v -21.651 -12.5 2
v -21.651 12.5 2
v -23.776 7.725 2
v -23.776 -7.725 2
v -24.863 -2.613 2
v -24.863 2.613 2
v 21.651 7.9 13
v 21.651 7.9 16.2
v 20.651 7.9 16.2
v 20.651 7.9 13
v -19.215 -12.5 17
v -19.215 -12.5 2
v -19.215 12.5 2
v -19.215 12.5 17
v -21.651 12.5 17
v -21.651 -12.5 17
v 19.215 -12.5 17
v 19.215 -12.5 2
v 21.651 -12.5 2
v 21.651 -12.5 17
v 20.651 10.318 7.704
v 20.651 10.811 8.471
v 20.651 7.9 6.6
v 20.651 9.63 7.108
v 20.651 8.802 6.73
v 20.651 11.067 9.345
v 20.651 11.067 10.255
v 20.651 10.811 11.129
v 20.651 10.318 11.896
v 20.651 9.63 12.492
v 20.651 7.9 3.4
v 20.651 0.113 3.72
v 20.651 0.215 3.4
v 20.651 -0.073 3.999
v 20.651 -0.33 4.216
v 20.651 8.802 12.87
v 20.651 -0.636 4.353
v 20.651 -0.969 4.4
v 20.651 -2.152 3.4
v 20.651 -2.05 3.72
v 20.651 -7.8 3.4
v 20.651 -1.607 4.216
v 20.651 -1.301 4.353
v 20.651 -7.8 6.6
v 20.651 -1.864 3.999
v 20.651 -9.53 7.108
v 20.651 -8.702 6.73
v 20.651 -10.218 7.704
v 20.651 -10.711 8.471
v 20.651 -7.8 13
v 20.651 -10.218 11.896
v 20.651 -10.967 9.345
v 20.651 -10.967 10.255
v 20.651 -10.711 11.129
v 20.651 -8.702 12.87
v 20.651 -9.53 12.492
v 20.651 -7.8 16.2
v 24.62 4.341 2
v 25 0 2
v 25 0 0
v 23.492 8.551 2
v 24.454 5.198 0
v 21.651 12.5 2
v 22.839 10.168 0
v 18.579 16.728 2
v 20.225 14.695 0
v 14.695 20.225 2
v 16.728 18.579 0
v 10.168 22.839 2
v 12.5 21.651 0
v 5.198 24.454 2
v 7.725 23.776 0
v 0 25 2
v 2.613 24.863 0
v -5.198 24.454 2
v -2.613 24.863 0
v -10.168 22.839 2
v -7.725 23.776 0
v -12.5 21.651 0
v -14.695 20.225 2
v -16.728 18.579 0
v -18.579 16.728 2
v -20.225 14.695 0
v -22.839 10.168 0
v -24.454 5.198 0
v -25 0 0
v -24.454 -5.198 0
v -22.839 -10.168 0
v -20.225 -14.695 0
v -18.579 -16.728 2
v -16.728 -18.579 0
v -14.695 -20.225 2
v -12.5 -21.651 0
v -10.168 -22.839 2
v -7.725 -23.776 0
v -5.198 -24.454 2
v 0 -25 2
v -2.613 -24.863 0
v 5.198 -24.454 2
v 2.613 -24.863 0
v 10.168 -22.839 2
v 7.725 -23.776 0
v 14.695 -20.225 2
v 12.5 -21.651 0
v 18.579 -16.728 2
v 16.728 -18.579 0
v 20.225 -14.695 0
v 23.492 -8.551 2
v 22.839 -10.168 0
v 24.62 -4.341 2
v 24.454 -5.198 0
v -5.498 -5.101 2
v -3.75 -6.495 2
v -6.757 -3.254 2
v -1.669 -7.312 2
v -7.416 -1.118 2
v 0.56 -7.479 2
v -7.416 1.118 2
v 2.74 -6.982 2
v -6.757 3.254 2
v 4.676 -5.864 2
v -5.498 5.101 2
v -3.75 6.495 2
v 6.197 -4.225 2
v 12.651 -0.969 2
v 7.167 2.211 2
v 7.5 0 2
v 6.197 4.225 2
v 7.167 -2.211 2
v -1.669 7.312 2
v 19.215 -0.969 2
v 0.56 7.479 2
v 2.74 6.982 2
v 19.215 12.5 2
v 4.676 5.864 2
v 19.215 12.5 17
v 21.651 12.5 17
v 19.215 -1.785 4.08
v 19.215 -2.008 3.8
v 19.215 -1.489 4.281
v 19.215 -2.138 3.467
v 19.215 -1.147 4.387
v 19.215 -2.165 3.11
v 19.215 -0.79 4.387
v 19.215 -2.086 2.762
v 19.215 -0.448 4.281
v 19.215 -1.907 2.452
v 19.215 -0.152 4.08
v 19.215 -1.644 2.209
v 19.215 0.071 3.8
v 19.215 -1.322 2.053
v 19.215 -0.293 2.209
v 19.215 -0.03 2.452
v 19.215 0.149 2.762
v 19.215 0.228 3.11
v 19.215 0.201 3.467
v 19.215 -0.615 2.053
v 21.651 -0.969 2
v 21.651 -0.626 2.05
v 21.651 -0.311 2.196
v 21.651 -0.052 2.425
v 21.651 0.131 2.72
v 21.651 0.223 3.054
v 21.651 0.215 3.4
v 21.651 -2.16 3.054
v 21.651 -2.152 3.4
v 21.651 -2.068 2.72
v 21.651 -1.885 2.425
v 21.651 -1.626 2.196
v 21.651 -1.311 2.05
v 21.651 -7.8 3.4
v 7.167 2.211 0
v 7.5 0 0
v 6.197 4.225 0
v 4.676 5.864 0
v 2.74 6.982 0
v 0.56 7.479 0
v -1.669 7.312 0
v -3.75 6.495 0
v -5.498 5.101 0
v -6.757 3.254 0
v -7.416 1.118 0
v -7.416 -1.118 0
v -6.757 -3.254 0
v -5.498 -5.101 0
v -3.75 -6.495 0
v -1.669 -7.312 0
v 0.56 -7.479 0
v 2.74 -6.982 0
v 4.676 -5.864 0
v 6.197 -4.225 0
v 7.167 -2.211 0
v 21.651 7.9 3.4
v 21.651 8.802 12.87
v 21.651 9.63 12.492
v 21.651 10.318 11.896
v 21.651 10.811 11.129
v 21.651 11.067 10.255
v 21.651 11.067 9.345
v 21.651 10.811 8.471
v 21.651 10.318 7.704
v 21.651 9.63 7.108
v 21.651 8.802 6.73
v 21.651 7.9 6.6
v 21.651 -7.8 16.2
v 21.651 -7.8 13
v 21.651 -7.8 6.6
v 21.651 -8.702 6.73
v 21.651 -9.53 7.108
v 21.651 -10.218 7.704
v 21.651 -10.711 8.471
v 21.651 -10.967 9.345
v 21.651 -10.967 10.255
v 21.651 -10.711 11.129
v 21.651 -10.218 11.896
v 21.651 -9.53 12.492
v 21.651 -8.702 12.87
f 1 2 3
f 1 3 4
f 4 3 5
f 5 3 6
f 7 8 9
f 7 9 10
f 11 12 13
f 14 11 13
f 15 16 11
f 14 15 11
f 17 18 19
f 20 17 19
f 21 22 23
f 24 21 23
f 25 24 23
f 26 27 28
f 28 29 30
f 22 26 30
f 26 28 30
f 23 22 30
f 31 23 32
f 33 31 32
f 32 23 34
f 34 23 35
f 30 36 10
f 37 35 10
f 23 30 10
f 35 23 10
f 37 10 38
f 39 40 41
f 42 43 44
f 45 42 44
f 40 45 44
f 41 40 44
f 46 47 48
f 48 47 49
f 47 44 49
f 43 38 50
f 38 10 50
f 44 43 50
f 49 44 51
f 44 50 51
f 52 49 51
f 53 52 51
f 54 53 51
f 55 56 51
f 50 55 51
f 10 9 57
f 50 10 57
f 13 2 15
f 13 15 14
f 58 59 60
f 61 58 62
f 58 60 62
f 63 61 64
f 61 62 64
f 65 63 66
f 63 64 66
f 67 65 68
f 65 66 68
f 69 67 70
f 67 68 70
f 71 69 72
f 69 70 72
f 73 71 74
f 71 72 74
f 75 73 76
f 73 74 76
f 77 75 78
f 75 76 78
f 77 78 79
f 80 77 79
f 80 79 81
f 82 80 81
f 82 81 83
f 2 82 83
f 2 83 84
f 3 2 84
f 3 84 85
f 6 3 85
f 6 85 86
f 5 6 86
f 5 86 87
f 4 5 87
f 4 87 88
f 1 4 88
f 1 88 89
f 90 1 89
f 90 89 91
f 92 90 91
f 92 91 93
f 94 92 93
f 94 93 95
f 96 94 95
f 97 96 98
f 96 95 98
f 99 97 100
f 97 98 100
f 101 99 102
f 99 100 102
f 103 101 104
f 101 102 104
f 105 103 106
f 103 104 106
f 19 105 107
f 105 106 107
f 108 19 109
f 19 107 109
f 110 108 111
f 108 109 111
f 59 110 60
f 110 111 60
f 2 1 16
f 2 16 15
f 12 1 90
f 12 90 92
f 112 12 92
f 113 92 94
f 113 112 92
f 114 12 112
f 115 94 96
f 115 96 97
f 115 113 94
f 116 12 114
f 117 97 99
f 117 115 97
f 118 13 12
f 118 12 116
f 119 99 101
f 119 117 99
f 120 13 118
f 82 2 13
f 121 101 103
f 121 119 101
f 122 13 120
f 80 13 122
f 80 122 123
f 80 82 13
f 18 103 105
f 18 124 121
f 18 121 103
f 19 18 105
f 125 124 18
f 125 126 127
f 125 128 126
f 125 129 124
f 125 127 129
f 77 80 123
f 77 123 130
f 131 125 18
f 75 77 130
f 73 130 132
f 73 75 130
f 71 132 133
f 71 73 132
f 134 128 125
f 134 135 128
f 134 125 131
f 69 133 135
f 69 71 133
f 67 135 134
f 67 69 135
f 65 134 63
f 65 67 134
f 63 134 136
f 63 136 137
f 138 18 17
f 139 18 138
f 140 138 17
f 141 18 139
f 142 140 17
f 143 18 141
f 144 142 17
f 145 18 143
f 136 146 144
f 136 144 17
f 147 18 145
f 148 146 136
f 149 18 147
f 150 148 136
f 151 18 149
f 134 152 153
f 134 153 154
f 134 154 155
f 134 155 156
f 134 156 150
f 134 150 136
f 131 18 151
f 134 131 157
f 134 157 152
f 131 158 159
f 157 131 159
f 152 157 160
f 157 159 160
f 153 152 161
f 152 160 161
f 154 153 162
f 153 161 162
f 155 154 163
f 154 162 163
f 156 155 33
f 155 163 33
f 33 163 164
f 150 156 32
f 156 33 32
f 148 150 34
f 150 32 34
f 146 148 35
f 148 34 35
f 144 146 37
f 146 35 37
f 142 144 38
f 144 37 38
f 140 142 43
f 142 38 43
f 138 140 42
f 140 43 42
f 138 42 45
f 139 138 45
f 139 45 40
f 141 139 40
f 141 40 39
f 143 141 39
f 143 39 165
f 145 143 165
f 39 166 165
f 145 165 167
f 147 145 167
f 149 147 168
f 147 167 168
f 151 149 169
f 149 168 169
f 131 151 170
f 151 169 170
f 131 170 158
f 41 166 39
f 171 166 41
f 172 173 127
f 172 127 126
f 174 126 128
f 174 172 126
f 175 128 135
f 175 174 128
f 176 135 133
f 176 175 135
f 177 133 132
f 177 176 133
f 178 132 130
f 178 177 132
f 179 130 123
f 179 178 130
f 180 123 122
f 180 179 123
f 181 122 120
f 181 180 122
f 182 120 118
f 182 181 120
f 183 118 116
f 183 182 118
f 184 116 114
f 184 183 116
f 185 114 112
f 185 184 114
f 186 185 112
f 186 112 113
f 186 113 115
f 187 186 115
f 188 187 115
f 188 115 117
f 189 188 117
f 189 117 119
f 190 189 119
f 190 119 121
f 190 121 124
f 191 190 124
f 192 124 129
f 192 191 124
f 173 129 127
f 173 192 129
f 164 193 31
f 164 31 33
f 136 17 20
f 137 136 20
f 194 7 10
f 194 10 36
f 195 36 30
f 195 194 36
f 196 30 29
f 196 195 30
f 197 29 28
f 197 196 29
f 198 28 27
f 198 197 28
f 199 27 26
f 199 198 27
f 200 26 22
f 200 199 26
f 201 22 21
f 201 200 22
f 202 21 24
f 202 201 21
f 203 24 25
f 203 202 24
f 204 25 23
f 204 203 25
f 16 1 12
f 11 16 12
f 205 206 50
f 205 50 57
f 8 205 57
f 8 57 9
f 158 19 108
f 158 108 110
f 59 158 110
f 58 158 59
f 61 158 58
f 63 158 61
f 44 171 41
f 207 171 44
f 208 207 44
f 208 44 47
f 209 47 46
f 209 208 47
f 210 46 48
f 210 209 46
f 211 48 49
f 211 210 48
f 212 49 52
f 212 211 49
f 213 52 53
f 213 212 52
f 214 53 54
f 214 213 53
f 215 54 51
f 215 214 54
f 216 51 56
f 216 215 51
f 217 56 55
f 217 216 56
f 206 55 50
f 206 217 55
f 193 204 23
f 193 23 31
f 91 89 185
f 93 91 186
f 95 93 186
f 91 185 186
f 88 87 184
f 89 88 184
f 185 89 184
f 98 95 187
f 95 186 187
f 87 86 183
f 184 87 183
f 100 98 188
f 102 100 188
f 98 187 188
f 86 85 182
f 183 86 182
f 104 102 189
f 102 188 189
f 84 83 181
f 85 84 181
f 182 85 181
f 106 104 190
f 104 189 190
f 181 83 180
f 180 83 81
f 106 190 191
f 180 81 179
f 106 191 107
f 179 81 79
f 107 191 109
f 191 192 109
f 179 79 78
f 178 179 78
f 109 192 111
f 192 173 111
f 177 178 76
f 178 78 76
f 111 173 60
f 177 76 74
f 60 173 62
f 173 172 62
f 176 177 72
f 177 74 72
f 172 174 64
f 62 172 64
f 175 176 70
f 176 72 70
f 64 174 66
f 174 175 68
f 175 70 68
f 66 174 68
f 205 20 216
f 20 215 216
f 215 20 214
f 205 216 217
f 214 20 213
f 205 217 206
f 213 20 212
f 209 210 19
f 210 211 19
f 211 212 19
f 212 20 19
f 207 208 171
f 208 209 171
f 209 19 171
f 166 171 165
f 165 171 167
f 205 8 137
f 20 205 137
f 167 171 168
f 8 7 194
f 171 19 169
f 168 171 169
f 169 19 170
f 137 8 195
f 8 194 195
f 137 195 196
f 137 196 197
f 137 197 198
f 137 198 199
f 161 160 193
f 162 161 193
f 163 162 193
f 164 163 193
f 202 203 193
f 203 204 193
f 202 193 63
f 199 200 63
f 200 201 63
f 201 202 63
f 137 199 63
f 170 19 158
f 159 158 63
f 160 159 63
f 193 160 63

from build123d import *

# Parameters (mm, degrees)
SKETCH1_R           = 25
SKETCH1_R_2         = 7.5
BOSS_EXTRUDE1_DEPTH = 2
SKETCH3_W           = 2.436097603
SKETCH3_H           = 25
BOSS_EXTRUDE2_DEPTH = 15
SKETCH3_3_W         = 2.436097603
SKETCH3_3_H         = 25
BOSS_EXTRUDE3_DEPTH = 15
CUT_EXTRUDE3_DEPTH  = 1
SKETCH10_R          = 1.2
CUT_EXTRUDE4_DEPTH  = 9


with BuildPart() as part:
    # Sketch1 → Boss-Extrude1 (new body)
    with BuildSketch(Plane(origin=(0, 0, 0), x_dir=(0, 1, 0), z_dir=(0, 0, 1))):
        Circle(SKETCH1_R)
        Circle(SKETCH1_R_2, mode=Mode.SUBTRACT)
    extrude(amount=BOSS_EXTRUDE1_DEPTH)

    # Sketch3 → Boss-Extrude2 (add)
    with BuildSketch(Plane.XY.offset(2)):
        with Locations((-20.432586294, 0)):
            Rectangle(SKETCH3_W, SKETCH3_H)
    extrude(amount=BOSS_EXTRUDE2_DEPTH)

    # Sketch3<3> → Boss-Extrude3 (add)
    with BuildSketch(Plane.XY.offset(2)):
        with Locations((20.432586294, 0)):
            Rectangle(SKETCH3_3_W, SKETCH3_3_H)
        with Locations((-20.432586294, 0)):
            Rectangle(SKETCH3_3_W, SKETCH3_3_H)
    extrude(amount=BOSS_EXTRUDE3_DEPTH)

    # Sketch9 → Cut-Extrude3 (cut)
    with BuildSketch(Plane.YZ.offset(21.650635095)):
        with BuildLine():
            Line((-7.8, 16.2), (7.9, 16.2))
            Line((7.9, 16.2), (7.9, 13))
            ThreePointArc((7.9, 13), (11.1, 9.8), (7.9, 6.6))
            Line((7.9, 6.6), (7.9, 3.4))
            Line((7.9, 3.4), (-7.8, 3.4))
            Line((-7.8, 3.4), (-7.8, 6.6))
            ThreePointArc((-7.8, 6.6), (-11, 9.8), (-7.8, 13))
            Line((-7.8, 13), (-7.8, 16.2))
        make_face()
    extrude(amount=-CUT_EXTRUDE3_DEPTH, mode=Mode.SUBTRACT)

    # Sketch10 → Cut-Extrude4 (cut)
    with BuildSketch(Plane.YZ.offset(21.650635095)):
        with Locations((-0.968507973, 3.2)):
            Circle(SKETCH10_R)
    extrude(amount=-CUT_EXTRUDE4_DEPTH, mode=Mode.SUBTRACT)


solid = part.part
